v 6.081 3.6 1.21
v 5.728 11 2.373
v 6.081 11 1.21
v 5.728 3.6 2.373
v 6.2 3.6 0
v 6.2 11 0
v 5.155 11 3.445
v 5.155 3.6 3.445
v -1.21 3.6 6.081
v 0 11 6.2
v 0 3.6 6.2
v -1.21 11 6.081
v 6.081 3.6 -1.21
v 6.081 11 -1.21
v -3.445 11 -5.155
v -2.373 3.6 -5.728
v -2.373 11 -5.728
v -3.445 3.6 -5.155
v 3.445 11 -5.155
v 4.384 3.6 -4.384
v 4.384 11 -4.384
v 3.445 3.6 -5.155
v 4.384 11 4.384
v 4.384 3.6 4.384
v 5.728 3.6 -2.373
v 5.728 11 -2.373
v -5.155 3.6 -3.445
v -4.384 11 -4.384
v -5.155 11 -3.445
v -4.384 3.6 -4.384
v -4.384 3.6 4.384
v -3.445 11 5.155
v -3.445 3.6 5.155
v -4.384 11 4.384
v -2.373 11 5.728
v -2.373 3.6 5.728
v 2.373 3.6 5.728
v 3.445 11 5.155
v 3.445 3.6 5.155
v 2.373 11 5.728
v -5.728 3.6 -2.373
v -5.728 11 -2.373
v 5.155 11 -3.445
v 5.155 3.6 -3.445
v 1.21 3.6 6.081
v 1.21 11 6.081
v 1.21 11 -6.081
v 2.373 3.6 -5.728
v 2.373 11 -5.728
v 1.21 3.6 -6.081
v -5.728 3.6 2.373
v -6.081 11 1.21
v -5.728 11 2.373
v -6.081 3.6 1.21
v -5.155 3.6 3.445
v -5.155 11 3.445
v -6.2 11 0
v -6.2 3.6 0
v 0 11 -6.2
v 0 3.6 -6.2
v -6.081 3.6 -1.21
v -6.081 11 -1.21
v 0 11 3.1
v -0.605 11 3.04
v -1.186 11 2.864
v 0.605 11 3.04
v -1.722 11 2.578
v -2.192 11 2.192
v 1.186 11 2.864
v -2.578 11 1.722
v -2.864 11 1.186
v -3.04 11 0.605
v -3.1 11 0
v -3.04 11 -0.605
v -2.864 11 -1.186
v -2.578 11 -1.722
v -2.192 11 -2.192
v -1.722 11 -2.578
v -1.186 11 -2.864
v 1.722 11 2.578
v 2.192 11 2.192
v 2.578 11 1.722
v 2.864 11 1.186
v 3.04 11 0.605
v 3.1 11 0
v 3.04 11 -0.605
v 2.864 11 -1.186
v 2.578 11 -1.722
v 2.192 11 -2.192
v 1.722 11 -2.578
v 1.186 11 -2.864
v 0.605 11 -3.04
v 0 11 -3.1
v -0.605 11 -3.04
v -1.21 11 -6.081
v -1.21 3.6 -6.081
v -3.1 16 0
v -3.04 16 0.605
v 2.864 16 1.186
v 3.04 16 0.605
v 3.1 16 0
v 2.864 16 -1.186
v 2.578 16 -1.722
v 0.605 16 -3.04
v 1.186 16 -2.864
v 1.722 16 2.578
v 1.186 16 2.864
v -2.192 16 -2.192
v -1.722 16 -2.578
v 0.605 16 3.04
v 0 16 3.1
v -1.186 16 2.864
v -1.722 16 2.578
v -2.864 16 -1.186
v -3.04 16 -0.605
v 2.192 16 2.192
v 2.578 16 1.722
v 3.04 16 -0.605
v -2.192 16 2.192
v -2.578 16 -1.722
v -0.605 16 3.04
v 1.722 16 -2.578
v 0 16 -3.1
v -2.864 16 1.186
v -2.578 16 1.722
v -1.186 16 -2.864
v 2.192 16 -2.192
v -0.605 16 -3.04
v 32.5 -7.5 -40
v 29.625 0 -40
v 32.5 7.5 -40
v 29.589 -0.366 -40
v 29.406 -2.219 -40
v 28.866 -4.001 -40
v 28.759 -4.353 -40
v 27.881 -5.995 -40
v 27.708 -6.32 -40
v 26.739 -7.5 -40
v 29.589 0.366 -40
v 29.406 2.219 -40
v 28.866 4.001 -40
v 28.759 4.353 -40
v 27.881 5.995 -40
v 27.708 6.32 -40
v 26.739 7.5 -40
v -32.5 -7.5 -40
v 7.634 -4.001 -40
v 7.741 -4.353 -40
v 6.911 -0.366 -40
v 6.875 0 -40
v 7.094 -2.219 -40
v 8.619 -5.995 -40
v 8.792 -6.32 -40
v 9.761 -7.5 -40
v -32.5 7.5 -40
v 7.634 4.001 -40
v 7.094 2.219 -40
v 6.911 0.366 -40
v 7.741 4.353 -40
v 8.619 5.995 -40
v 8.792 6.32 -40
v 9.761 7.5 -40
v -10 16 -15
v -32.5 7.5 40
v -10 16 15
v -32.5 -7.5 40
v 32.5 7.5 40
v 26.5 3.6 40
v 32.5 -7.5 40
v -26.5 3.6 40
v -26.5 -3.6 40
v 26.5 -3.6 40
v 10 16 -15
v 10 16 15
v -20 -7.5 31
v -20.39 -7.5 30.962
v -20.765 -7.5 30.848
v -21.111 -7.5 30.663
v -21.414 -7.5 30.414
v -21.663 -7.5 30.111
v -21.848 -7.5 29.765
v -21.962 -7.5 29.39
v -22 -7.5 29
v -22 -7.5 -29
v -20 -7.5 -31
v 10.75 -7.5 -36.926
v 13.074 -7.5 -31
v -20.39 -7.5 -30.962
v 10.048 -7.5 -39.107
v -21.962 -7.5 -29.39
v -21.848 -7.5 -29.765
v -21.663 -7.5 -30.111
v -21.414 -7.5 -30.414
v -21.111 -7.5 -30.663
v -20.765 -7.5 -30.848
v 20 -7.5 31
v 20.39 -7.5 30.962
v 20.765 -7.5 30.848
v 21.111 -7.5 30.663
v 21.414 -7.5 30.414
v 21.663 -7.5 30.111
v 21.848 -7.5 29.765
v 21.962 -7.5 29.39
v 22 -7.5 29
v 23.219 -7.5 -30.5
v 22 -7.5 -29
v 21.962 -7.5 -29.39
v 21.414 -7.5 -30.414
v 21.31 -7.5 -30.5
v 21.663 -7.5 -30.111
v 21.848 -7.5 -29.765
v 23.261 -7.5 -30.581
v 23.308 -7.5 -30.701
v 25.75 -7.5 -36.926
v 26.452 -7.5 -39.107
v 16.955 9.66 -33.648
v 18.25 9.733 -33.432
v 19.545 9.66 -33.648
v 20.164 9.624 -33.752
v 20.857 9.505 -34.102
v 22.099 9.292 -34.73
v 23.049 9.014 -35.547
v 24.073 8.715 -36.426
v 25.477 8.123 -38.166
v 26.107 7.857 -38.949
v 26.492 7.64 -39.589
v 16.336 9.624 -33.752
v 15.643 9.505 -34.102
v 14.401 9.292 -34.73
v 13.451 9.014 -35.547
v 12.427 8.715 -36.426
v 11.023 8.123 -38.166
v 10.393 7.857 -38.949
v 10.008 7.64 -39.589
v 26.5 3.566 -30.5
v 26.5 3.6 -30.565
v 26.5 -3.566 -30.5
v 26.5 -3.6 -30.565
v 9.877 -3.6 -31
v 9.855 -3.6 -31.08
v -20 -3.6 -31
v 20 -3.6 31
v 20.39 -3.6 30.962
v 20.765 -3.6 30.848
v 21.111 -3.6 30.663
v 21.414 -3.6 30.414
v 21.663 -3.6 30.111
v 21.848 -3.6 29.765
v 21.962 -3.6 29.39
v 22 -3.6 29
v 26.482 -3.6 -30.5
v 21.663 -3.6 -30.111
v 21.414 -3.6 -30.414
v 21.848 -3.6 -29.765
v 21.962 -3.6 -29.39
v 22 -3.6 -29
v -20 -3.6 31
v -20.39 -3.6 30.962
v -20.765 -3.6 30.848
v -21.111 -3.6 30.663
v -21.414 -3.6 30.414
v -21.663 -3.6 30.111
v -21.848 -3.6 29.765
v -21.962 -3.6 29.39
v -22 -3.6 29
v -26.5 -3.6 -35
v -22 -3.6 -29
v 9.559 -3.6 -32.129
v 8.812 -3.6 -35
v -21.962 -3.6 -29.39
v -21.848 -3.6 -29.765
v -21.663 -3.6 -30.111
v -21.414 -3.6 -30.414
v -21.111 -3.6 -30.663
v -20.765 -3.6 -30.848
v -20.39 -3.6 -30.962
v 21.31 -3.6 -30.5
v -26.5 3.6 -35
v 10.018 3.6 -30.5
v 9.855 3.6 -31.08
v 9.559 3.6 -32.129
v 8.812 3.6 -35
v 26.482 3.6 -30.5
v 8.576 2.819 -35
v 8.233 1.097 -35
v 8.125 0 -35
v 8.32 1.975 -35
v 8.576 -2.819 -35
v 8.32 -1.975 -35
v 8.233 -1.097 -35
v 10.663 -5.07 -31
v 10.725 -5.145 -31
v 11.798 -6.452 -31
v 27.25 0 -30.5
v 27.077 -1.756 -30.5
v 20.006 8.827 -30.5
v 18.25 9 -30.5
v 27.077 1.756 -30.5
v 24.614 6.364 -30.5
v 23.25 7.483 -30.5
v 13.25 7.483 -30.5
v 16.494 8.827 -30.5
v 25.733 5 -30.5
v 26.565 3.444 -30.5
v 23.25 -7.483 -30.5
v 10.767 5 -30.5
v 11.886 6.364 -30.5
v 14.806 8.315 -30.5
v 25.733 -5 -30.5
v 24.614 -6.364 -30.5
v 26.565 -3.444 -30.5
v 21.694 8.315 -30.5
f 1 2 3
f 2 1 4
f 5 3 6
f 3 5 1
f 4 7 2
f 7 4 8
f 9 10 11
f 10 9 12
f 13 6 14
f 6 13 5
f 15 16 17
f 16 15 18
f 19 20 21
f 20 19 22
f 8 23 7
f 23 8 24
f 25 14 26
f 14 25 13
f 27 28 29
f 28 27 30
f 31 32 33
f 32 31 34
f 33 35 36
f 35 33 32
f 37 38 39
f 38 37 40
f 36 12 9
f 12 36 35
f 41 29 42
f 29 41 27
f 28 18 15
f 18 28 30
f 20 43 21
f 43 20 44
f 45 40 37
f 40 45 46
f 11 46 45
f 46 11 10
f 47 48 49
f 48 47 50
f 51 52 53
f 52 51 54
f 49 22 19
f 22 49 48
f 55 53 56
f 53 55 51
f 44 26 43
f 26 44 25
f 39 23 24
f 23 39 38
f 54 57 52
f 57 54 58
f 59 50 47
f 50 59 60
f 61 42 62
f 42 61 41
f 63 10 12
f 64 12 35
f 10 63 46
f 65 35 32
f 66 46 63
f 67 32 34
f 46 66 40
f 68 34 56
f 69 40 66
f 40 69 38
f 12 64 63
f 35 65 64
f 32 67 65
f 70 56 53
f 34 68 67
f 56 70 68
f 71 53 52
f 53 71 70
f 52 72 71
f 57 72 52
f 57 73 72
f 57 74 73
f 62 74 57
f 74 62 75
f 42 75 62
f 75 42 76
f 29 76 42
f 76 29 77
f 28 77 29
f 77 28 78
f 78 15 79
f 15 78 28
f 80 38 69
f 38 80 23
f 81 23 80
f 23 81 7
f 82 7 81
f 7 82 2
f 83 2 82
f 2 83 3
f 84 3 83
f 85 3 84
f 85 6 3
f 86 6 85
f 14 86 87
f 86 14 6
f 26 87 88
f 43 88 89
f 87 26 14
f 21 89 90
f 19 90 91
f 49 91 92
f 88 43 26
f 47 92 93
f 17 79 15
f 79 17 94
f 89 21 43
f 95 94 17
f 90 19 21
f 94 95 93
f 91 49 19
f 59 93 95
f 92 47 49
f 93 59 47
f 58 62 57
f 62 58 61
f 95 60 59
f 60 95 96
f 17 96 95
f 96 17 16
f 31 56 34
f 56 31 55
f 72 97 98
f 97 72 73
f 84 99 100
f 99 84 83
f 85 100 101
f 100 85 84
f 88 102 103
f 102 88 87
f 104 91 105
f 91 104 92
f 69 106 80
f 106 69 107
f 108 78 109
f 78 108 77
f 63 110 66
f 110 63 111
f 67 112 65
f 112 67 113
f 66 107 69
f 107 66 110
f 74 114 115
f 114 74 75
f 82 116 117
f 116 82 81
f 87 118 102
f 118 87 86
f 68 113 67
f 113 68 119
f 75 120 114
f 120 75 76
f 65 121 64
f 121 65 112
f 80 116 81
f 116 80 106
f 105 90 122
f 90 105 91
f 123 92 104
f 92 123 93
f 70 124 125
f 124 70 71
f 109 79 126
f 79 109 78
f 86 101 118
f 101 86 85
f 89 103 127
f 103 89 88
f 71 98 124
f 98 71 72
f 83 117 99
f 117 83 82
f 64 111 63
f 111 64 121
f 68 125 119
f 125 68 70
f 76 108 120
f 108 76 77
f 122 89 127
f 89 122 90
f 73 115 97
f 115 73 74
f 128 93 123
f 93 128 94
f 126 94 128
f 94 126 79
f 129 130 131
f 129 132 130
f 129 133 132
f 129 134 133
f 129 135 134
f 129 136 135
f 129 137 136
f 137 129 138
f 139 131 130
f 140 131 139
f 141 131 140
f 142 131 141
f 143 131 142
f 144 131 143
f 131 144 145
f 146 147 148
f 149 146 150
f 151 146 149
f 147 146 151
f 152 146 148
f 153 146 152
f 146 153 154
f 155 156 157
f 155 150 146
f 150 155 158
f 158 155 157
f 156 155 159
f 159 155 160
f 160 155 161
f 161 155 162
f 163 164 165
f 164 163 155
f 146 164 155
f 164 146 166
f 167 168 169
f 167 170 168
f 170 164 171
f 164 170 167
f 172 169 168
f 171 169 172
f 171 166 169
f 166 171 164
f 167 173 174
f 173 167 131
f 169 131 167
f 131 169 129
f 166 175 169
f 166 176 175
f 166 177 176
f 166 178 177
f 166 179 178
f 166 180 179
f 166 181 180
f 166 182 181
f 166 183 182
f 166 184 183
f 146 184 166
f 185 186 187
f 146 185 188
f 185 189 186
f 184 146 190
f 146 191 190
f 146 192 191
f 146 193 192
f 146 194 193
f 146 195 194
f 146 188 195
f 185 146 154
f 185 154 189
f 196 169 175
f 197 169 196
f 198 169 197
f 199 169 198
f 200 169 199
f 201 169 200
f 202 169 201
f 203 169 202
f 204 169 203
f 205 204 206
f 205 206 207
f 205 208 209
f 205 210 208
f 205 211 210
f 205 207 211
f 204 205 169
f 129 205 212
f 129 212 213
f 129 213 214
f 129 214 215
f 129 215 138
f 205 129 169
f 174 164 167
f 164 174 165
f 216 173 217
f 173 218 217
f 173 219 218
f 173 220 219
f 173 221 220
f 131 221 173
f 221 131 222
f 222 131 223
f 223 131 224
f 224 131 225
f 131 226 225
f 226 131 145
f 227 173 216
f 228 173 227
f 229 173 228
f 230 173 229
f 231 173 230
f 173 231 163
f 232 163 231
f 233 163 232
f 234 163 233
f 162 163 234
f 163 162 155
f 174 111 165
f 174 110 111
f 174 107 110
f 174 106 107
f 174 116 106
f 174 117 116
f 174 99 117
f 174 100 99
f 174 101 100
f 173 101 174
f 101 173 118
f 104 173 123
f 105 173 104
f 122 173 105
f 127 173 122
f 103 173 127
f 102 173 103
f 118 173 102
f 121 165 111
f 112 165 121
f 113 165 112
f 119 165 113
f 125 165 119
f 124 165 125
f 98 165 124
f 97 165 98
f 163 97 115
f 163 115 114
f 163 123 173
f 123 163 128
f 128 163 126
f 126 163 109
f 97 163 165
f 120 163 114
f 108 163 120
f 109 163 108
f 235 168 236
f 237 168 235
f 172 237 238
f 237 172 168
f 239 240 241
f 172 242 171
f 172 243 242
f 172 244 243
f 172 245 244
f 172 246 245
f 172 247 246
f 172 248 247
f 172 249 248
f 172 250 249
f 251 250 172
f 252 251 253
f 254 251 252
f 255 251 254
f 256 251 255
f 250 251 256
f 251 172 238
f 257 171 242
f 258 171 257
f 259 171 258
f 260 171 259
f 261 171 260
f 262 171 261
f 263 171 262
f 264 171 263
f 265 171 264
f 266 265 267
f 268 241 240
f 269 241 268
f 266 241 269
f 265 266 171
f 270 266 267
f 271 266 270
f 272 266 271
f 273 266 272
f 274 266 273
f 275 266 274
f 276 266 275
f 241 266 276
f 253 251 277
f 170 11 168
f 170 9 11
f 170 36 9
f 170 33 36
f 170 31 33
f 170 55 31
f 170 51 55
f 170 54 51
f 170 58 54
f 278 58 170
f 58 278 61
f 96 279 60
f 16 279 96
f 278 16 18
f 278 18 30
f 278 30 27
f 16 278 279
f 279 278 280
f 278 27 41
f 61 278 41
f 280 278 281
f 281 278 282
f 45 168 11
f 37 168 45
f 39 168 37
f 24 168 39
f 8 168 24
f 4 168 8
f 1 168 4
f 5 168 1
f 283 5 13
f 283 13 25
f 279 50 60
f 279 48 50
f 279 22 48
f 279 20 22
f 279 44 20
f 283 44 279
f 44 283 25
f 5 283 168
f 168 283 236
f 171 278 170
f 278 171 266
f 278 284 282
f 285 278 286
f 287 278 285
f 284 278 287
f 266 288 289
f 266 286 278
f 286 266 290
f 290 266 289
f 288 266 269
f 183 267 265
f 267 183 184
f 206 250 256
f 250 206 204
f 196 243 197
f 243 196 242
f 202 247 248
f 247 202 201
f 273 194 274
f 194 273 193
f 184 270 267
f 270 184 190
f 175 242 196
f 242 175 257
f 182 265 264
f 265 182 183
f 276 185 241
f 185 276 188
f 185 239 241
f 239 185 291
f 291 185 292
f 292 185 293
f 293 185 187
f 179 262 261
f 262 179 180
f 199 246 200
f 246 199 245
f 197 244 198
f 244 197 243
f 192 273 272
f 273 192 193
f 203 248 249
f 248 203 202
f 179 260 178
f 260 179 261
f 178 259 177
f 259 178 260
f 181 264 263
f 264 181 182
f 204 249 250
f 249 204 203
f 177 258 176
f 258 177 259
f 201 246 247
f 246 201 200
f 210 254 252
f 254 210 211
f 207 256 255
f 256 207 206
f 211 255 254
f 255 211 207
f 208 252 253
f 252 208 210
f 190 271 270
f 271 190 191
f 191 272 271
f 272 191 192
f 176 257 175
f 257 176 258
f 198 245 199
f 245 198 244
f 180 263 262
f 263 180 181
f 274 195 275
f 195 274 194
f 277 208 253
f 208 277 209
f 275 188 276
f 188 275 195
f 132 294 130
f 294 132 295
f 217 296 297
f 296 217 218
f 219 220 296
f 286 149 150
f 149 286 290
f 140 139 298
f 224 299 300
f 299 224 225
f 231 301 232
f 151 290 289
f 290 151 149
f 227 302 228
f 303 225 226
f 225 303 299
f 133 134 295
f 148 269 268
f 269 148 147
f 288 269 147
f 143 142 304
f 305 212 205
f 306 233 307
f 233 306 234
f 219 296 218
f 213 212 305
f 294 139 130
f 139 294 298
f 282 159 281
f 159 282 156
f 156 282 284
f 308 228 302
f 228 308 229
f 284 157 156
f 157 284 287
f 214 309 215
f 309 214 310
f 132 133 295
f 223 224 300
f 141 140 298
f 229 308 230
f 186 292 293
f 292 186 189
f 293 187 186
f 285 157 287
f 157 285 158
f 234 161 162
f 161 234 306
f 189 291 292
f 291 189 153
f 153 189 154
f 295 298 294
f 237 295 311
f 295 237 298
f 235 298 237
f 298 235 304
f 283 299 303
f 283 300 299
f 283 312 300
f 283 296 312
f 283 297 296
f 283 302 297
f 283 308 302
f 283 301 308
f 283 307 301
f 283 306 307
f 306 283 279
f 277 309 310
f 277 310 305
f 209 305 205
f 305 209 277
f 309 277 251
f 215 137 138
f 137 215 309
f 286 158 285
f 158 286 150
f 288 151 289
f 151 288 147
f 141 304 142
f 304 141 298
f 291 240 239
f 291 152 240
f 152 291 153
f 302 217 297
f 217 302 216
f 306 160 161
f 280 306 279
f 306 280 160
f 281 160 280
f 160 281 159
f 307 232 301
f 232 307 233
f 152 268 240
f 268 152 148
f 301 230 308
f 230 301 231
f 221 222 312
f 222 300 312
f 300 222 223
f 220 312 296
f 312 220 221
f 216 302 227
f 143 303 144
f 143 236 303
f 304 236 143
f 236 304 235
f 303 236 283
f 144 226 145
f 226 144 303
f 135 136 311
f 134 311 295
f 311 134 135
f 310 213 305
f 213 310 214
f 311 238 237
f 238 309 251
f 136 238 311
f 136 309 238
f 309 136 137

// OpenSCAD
// file: iPod_nano_4gen_bike_mount.scad
$fn=50;

// iPod nano 4th gen, measured lying on its back
ipod_n4_depth=70;        // top to bottom when looking at the display
ipod_n4_width=53;        // left ro right when looking at the display
ipod_n4_edge_radius=5.3; // radius of circle describing the edge's radius

// tiefe komplett: 6.6
// höhe: 70

module iPodShape(x=58, y=100, r1=4.8,r2=2.8) {
    hull() {
        for( xoff = [-x/2+r1,x/2-r1]) {
            for( yoff = [-y/2+r1,y/2-r1]) {
                translate([xoff,yoff,0]) union() {
                    difference() {
                        sphere(r=r1, center=true);
                        translate([0,0,r1]) cube(2*r1,center=true);
                    }
                    scale([1,1,r2/r1]) sphere(r=r1, center=true);
                }
            }
        }
    }
}

// this will be attached to the bike's handles
module iPod_Stand_Groundplate(width, lenght, height) {
	x=width;
    y=length;
    z=height;
    union() {
        cube([x,y,z], center=true);
    }
}

//iPod_nano_g4_stampout(ipod_n4_width, ipod_n4_depth, 2, ipod_n4_edge_radius);
//iPod_Stand_Groundplate(ipod_n4_width+0.5, ipod_n4_depth+0.5, 0.2);
// main file
include <iPod_nano_4gen_bike_mount.scad>

$fn=32;

rotate([90,0,0])
difference() {
    /*
    translate([0,0,-1]) cube([65,1,12],center=true);
    iPodShape();
    */
    //union() {
    hull() {
        cube([65,80,15], center=true);
        translate([0,0,-7-9/2]) cube([20,30,9],center=true);
    }
    translate([0,50-80/2+5,0]) cube([53,100,7.2], center=true);
    //translate([0,50-80/2+5,1]) iPodShape();
    translate([0,0,25]) hull() {
        for(x=[-44/2+4/2,44/2-4/2]) {
            for(y=[-62/2+4/2,62/2-4/2]) {
                translate([x,y,0]) rotate([0,0,0]) cylinder(r=4/2,h=50,center=true);
            }
        }
    }
    translate([52.5/2-8,-62/2+0.5,0]) rotate([90,0,0]) cylinder(r1=9,r2=12,h=10+2);
    translate([0,0,-11]) union(){
        translate([0,0,50]) cylinder(r=6.2, h=100, center=true);
        translate([0,0,0]) cylinder(r=3.1, h=100, center=true);
    }
}
